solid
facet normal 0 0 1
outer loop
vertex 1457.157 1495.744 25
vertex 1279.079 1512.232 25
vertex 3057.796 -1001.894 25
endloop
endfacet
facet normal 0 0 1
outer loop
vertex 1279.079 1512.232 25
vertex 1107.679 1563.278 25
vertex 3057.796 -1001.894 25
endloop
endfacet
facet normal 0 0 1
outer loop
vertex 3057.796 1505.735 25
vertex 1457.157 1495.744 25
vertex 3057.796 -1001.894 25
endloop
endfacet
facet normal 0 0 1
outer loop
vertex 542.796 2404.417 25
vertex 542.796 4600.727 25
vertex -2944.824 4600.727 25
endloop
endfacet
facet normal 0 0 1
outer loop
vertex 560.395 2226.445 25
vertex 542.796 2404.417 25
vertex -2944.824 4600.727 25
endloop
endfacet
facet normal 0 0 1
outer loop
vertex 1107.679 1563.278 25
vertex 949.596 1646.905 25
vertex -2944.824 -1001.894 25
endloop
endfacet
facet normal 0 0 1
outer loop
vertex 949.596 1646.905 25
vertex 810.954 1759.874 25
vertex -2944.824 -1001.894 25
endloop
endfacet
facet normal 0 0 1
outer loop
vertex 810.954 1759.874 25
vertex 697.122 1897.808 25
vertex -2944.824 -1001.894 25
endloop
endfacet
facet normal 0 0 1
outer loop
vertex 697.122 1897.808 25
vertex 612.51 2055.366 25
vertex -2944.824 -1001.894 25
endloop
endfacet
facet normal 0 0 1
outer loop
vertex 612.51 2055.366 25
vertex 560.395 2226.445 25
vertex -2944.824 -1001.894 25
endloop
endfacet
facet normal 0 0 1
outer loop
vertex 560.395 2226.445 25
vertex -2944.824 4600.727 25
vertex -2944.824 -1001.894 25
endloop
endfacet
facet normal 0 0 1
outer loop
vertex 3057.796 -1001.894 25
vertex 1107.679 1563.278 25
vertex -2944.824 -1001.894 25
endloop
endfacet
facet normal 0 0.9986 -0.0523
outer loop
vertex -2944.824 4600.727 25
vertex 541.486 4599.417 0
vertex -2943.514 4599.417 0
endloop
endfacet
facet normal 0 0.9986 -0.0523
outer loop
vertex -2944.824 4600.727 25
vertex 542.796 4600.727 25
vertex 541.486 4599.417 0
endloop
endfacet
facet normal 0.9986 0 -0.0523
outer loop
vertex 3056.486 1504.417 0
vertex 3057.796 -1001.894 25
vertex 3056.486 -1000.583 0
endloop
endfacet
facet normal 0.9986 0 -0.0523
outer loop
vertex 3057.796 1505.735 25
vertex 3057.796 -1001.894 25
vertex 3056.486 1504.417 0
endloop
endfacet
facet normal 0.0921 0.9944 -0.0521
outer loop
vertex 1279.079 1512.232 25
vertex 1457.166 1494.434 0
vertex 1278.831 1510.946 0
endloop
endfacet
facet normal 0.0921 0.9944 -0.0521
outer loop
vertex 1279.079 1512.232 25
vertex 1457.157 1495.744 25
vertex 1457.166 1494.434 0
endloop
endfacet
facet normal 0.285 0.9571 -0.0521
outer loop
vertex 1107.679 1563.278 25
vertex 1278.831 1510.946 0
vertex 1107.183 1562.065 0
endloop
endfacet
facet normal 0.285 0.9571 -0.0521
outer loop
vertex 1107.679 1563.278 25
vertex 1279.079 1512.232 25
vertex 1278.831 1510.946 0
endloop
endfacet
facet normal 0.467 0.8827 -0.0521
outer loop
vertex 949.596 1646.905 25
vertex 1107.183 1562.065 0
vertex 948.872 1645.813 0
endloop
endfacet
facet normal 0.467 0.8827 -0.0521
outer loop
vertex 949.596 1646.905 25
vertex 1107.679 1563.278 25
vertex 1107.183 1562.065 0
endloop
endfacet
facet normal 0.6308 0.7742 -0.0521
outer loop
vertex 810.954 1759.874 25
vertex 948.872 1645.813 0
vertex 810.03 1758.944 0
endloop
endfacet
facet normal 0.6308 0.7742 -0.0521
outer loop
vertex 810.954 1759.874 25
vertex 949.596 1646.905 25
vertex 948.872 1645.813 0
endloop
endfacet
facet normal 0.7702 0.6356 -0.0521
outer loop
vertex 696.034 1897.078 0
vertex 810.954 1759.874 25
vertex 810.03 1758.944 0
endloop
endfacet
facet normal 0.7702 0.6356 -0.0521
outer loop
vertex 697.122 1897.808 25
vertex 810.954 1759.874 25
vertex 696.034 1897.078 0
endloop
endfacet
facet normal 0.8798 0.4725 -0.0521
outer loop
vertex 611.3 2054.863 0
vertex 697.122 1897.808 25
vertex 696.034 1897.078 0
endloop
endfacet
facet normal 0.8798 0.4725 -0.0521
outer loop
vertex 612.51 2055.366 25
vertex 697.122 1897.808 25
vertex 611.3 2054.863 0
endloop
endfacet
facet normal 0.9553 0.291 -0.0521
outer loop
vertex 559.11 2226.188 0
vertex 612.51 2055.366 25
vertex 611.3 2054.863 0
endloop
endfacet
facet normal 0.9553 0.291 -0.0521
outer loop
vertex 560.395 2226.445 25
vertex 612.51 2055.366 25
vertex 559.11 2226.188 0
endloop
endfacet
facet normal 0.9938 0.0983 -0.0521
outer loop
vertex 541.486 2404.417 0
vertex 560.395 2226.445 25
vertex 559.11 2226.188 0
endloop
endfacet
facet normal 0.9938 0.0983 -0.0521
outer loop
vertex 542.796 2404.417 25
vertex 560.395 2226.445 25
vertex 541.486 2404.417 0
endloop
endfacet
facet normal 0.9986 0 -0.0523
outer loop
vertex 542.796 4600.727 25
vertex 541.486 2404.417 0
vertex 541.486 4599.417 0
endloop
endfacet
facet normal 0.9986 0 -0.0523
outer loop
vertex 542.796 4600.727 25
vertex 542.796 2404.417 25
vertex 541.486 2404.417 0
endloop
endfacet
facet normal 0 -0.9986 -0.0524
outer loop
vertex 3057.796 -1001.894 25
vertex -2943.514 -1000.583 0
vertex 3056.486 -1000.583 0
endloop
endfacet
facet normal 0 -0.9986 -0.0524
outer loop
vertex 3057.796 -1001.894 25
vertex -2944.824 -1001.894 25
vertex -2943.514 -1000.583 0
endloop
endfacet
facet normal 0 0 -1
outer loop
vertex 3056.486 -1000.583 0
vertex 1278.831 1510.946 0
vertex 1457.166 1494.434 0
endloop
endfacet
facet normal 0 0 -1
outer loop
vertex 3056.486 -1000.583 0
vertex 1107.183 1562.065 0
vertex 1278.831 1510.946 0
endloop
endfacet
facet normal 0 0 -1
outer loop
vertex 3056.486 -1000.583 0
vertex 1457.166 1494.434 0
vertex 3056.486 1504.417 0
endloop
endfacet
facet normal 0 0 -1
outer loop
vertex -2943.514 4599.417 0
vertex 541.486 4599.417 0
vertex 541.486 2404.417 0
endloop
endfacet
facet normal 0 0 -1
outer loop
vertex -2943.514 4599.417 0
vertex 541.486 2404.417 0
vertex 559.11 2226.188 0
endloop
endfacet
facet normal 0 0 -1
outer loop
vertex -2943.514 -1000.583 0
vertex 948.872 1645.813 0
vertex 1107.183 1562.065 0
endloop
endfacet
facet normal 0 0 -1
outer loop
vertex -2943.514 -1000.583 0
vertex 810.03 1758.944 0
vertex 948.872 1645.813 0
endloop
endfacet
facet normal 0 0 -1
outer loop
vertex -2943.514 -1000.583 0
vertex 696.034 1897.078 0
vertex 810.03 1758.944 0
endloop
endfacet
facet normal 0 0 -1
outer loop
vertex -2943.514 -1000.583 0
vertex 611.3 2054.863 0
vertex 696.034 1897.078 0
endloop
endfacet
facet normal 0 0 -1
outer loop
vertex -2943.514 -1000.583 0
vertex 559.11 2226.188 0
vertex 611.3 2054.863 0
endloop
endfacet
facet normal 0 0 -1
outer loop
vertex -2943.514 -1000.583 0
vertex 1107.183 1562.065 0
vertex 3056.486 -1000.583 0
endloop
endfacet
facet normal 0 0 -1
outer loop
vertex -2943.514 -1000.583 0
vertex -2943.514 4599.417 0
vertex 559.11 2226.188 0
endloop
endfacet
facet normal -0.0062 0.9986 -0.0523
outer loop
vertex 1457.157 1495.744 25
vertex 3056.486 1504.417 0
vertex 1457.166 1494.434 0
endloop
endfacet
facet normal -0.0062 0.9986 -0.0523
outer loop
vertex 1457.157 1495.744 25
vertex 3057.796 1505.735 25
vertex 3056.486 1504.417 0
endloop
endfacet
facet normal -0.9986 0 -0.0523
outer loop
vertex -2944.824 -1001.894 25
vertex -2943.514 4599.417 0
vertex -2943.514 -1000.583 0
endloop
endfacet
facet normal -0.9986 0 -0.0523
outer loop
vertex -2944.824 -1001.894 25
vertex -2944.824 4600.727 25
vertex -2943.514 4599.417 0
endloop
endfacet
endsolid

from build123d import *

# Parameters (mm, degrees)
F1_DEPTH = 25
F1_TAPER = -3


with BuildPart() as f1:
    # F0 (on Top) → F1 (new body)
    with BuildSketch(Plane.XY):
        with BuildLine():
            Line((-2943.5140639544, 4599.4165127277), (-2943.5140639544, -1000.5834872723))
            Line((-2943.5140639544, -1000.5834872723), (3056.4859360456, -1000.5834872723))
            Line((3056.4859360456, -1000.5834872723), (3056.4859360456, 1504.4165127277))
            Line((3056.4859360456, 1504.4165127277), (2766.4859360456, 1502.6064564302))
            Line((2766.4859360456, 1502.6064564302), (2476.4859360456, 1500.7964001326))
            Line((2476.4859360456, 1500.7964001326), (2186.4859360456, 1498.986343835))
            Line((2186.4859360456, 1498.986343835), (1896.4859360456, 1497.1762875374))
            Line((1896.4859360456, 1497.1762875374), (1457.1656572439, 1494.4342377536))
            ThreePointArc((1457.1656572439, 1494.4342377536), (810.0299930108, 1758.9443807614), (541.4859360456, 2404.4165127277))
            Line((541.4859360456, 2404.4165127277), (541.4859360456, 2855.2801705543))
            Line((541.4859360456, 2855.2801705543), (541.4859360456, 3145.2861896182))
            Line((541.4859360456, 3145.2861896182), (541.4859360456, 3435.292208682))
            Line((541.4859360456, 3435.292208682), (541.4859360456, 3725.2982277458))
            Line((541.4859360456, 3725.2982277458), (541.4859360456, 4015.3042468096))
            Line((541.4859360456, 4015.3042468096), (541.4859360456, 4305.3102658735))
            Line((541.4859360456, 4305.3102658735), (541.4859360456, 4599.4165127277))
            Line((541.4859360456, 4599.4165127277), (-2943.5140639544, 4599.4165127277))
        make_face()
    extrude(amount=F1_DEPTH, taper=F1_TAPER)


solid = f1.part
